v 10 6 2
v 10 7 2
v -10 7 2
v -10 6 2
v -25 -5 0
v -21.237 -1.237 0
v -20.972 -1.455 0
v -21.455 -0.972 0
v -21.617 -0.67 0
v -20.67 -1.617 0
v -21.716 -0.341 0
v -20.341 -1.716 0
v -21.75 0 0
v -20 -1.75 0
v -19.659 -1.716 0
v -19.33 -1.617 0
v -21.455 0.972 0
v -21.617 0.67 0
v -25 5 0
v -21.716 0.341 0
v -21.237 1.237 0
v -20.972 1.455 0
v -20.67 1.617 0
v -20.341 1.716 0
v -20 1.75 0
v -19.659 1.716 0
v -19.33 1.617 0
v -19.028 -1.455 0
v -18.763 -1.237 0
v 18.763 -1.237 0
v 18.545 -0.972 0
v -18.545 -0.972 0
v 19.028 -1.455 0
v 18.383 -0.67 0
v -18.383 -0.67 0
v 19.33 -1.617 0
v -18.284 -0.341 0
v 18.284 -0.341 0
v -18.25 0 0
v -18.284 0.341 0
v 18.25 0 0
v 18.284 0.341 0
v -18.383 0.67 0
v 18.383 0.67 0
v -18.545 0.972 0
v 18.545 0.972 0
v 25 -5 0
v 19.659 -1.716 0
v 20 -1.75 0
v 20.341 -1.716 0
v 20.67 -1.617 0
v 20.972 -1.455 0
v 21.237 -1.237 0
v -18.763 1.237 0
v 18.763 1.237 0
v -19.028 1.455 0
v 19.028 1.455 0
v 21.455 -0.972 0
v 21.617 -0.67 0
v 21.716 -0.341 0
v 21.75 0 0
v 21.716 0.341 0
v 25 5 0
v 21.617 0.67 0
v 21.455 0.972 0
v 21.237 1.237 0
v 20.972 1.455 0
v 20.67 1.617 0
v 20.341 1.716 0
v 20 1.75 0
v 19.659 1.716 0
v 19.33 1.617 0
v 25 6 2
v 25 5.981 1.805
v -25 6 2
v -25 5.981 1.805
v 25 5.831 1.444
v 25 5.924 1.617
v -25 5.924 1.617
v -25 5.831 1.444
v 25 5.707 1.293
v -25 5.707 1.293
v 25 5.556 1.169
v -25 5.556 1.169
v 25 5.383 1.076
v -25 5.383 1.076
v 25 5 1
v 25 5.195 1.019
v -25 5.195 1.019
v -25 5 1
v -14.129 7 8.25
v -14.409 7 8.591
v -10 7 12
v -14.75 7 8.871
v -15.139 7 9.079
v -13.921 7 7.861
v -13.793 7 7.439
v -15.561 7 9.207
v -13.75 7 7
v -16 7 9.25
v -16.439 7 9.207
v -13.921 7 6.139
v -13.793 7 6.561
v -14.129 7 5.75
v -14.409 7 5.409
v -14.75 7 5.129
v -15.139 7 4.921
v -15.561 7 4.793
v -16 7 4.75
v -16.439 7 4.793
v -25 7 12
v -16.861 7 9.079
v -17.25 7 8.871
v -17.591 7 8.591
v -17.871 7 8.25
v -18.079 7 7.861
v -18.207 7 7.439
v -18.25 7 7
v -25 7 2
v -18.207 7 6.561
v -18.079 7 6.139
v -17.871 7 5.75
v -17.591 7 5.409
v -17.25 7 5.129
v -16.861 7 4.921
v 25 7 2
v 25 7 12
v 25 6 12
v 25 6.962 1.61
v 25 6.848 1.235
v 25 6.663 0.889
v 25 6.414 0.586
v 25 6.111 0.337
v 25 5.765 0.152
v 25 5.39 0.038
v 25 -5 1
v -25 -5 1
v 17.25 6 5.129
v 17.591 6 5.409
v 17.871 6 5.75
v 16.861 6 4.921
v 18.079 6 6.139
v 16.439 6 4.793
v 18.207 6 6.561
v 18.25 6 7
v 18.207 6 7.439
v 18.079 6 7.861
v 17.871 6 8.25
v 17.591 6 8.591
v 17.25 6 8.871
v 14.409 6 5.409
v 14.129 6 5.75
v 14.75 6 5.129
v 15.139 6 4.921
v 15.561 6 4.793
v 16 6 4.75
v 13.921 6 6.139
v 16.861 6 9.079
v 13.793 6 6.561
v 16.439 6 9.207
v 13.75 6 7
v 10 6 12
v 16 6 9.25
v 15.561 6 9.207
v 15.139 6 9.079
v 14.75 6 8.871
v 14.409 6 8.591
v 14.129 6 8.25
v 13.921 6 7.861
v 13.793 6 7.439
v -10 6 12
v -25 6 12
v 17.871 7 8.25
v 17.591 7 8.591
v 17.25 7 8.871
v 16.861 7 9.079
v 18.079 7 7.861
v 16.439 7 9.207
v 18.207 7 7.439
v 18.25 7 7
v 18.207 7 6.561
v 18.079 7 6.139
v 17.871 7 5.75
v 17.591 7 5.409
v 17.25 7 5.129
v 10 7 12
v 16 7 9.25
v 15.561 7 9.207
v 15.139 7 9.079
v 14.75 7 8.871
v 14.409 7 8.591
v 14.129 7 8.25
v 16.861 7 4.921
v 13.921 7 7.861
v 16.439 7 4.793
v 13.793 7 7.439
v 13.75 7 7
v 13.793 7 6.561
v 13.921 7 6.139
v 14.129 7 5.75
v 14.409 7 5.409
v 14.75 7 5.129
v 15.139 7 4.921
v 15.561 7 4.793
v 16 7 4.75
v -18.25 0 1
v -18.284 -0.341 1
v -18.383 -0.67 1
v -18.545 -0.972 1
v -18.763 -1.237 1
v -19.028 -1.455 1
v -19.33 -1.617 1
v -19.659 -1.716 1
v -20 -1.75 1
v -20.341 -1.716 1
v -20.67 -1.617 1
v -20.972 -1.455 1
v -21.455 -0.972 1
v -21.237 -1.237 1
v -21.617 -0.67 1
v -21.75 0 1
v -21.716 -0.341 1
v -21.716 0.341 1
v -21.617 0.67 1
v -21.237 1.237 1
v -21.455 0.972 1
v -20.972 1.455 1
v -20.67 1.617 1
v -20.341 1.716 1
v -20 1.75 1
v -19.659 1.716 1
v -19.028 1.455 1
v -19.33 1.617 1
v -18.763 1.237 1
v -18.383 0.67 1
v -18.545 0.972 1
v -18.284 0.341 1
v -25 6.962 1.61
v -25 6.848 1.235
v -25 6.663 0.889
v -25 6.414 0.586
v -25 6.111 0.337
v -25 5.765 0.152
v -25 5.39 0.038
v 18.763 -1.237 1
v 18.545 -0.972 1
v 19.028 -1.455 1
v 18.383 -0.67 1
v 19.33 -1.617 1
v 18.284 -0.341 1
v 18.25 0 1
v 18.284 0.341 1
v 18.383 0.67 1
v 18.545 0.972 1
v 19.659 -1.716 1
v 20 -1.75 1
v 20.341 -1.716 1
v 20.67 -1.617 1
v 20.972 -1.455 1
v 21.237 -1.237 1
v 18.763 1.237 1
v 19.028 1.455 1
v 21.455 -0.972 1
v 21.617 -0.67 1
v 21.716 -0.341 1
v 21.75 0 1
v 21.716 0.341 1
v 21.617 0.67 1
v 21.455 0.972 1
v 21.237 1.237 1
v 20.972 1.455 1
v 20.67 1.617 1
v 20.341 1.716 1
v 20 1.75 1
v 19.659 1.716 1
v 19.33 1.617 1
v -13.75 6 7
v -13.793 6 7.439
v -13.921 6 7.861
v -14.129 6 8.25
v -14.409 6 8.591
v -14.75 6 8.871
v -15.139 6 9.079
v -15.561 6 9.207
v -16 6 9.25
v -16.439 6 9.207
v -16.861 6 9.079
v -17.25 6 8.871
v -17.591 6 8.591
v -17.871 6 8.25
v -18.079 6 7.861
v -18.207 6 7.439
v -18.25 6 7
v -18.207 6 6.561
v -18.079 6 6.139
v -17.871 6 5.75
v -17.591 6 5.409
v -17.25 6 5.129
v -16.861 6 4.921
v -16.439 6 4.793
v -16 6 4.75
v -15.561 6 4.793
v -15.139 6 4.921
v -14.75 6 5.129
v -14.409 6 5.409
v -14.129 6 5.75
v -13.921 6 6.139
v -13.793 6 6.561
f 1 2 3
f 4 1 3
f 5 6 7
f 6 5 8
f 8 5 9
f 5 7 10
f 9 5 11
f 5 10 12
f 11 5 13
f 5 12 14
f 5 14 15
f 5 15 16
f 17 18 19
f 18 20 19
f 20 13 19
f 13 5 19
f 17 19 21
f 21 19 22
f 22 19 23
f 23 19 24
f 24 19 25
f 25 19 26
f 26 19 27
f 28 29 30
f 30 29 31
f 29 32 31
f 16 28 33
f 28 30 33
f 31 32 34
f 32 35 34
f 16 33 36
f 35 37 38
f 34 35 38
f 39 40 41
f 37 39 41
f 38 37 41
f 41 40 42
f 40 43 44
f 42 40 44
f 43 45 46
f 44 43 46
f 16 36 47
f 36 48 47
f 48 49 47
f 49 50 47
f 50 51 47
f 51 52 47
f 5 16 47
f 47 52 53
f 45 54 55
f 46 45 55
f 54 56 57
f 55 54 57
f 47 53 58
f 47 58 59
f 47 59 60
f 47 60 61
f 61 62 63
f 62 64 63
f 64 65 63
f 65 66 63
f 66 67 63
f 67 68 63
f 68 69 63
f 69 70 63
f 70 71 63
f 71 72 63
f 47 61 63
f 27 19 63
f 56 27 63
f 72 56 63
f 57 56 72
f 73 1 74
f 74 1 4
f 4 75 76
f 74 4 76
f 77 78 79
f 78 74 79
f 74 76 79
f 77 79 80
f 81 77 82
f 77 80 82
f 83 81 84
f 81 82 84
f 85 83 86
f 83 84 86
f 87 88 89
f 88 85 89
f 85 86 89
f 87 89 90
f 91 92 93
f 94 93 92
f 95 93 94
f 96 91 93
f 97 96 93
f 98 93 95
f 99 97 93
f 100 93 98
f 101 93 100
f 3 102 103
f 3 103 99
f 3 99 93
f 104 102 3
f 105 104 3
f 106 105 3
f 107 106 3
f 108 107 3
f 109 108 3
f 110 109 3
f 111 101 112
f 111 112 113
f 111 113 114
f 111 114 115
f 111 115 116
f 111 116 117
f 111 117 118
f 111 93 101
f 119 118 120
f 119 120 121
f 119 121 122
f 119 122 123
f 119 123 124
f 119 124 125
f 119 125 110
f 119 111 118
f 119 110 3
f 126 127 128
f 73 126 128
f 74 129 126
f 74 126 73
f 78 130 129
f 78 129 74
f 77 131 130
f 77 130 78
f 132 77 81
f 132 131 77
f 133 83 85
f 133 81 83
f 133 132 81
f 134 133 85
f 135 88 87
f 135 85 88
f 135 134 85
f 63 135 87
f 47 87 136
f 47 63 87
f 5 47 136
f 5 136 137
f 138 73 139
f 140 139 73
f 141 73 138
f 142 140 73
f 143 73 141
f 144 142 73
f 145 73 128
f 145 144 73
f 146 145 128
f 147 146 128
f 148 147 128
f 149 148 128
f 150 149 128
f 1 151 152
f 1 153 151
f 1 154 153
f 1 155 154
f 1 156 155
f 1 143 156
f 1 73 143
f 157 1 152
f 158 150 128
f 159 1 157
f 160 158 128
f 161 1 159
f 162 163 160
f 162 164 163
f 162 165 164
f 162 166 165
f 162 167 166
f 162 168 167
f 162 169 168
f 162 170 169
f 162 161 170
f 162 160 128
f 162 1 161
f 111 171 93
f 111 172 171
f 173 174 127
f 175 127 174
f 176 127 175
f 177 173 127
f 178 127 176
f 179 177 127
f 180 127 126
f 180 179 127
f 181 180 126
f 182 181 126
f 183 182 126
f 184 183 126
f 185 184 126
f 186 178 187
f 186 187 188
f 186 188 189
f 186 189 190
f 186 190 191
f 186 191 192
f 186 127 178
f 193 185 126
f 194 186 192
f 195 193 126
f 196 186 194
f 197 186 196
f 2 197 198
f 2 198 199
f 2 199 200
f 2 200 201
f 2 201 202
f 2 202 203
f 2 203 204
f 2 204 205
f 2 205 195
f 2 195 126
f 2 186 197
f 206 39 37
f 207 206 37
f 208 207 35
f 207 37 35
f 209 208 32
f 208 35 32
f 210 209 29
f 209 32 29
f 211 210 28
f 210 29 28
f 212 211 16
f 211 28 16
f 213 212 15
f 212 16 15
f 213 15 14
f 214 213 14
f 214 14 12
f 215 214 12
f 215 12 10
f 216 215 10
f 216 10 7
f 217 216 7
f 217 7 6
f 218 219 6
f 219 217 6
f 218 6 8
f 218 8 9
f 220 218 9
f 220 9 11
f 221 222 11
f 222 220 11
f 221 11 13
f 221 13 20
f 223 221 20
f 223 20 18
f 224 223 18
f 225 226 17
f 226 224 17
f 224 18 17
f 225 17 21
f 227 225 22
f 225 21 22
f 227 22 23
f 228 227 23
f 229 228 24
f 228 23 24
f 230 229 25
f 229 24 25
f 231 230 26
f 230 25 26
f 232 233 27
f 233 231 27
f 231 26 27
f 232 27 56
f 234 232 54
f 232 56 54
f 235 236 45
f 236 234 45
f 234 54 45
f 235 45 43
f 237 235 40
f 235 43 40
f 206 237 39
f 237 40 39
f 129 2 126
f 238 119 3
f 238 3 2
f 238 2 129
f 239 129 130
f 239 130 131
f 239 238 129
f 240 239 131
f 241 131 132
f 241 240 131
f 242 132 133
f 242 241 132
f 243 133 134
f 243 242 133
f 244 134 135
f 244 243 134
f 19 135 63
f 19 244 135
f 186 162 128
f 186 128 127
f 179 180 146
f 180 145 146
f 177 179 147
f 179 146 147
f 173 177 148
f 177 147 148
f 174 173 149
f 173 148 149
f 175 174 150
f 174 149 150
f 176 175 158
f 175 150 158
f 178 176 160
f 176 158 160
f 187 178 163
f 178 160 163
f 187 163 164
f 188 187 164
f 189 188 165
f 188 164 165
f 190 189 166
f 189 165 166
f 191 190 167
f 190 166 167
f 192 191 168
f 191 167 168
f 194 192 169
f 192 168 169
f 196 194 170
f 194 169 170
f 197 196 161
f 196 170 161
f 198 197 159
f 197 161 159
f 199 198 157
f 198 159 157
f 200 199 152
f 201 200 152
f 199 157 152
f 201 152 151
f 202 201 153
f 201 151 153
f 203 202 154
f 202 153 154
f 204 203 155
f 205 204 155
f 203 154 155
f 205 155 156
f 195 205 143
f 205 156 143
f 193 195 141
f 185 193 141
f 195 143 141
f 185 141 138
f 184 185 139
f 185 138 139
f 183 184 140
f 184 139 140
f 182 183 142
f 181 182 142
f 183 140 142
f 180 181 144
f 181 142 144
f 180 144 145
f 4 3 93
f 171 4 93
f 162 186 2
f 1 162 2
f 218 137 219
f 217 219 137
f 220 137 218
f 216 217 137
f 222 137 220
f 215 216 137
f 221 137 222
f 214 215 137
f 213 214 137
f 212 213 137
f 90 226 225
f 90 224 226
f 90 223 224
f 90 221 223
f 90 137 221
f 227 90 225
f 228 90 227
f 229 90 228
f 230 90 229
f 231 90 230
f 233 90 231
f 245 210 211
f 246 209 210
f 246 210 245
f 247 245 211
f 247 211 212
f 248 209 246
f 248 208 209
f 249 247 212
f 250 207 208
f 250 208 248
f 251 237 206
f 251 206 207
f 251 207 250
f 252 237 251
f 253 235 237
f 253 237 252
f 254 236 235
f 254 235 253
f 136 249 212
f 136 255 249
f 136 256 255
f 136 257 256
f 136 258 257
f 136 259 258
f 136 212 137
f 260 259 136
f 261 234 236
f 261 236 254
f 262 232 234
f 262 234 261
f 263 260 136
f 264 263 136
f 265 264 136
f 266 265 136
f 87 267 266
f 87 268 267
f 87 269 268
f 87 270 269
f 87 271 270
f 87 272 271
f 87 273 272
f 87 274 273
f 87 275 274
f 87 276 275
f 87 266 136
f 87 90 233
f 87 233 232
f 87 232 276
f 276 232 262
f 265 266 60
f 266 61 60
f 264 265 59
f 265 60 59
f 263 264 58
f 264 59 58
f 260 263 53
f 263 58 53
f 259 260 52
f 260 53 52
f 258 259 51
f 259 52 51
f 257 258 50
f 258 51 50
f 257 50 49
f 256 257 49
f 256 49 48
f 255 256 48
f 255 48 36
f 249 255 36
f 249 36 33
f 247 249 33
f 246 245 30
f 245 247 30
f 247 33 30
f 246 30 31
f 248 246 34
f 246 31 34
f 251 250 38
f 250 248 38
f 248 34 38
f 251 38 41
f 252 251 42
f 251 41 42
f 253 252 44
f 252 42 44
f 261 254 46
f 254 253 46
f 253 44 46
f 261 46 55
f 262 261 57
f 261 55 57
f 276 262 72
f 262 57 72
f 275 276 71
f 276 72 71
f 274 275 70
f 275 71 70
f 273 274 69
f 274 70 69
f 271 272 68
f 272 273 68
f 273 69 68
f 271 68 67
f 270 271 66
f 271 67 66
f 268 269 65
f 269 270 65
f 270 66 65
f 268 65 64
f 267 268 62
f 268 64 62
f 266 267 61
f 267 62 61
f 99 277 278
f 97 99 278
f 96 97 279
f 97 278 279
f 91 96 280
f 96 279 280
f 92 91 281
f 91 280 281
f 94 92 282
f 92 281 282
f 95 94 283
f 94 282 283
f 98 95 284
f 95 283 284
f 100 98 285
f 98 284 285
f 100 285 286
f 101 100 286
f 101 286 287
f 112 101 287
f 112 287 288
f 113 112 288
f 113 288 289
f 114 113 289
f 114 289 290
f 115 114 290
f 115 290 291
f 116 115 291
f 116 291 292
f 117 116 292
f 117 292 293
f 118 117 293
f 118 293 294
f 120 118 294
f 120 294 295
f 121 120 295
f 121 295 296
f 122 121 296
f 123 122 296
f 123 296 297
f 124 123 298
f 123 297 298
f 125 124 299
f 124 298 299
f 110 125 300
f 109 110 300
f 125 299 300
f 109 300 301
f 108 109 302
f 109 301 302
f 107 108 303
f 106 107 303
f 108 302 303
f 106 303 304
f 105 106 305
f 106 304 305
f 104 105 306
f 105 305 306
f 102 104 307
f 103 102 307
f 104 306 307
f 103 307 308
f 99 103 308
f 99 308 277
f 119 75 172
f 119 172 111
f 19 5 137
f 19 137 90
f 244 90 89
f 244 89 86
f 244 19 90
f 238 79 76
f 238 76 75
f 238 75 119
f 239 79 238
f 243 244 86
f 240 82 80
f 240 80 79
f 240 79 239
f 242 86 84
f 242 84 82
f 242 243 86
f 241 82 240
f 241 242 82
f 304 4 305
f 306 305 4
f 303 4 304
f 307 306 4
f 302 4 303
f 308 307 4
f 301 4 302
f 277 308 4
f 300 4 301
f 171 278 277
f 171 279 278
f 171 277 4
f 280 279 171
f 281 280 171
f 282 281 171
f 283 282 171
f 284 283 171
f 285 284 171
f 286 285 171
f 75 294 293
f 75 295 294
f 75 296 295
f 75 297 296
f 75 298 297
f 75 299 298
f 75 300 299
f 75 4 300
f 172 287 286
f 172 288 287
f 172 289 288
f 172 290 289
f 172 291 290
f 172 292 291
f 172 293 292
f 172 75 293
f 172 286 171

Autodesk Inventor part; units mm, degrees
ref_plane "YZ Plane" through (0, 0, 0) normal (1, 0, 0) x (0, 1, 0)
ref_plane "XZ Plane" through (0, 0, 0) normal (0, 1, 0) x (-1, 0, 0)
ref_plane "XY Plane" through (0, 0, 0) normal (0, 0, 1) x (1, 0, 0)
sketch "Sketch1" plane through (0, 0, 0) normal (0, 0, 1) x (1, 0, 0)
  line L0 (-25, 5) -> (25, 5)
  line L1 (25, 5) -> (25, -5)
  line L2 (25, -5) -> (-25, -5)
  line L3 (-25, -5) -> (-25, 5)
  line L4 (-25, 5) -> (25, -5) construction
  line L5 (25, 5) -> (-25, -5) construction
  circle A0 centre (-20, 0) radius 1.75
  line L6 (0, 0) -> (0, -5.5046) construction
  circle A1 centre (20, 0) radius 1.75
  dimension "d0" = 50
  dimension "d1" = 10
  dimension "d2" = 3.5
  dimension "d3" = 40
  dimension "d4" = 5
extrude "Plate1" add sketch "Sketch1" along normal blind 1
sketch "Sketch2" plane through (-25, 6, 2) normal (0, 1, 0) x (-1, 0, 0)
  line L0 (-50, 0) -> (0, 0)
  line L1 (0, 0) -> (0, 10)
  line L2 (0, 10) -> (-50, 10)
  line L3 (-50, 10) -> (-50, 0)
edge flange "Flange1" height 12 angle 90 thickness 1 bend radius 1 thickness toward (0, 1, 0) relief tear relief width 1 relief depth 0.5 edges at (0, 5, 1) wall of the first edge with corners at (25, 6, 2) (-25, 6, 2) (-25, 6, 12) (25, 6, 12)
bend "Bend1"
corner "Corner1"
sketch "Sketch3" plane through (-25, 6, 12) normal (0, -1, 0) x (1, 0, 0)
  circle A0 centre (41, -5) radius 2.25
  circle A1 centre (9, -5) radius 2.25
  line L0 (25, -12) -> (25, 5.1941) construction
  line L1 (50, -11) -> (0, -11) construction
  dimension "d20" = 4.5
  dimension "d21" = 4.5
  dimension "d22" = 32
  dimension "d23" = 6
extrude "Cut1" cut sketch "Sketch3" against normal blind 1
sketch "Sketch4" plane through (-25, 7, 12) normal (0, 1, 0) x (1, 0, 0)
  line L0 (50, 0) -> (0, 0) projected
  line L1 (35, 10) -> (15, 10)
  line L2 (15, 10) -> (15, 0)
  line L3 (15, 0) -> (35, 0)
  line L4 (35, 0) -> (35, 10)
  line L5 (35, 10) -> (15, 0) construction
  line L6 (15, 10) -> (35, 0) construction
  line L7 (50, 10) -> (0, 10) projected
  point P0 (25, 12)
  point P1 (25, 5)
  dimension "d26" = 20
extrude "Cut2" cut sketch "Sketch4" against normal blind 1
equation "\"d20\" = d21"
equation "\"d24\" = 厚度"
equation "\"d27\" = 厚度"
equation "\"d9\" = 厚度"
equation "\"d10\" = 折彎離隙寬度"
equation "\"d11\" = 折彎離隙深度"
equation "\"d12\" = 最小剩餘"
equation "\"d13\" = 轉移半徑"
equation "\"d16\" = 折彎半徑"
equation "\"d17\" = 轉角離隙大小"
equation "\"d18\" = 間隙大小"
equation "\"d19\" = Jacobi半徑大小"
equation "\"折彎半徑\" = 厚度"
equation "\"折彎離隙寬度\" = 厚度"
equation "\"折彎離隙深度\" = 0.5 * 厚度"
equation "\"轉角離隙大小\" = 4 * 厚度"
equation "\"最小剩餘\" = 2 * 厚度"
equation "\"轉移半徑\" = 折彎半徑"
equation "\"Jacobi半徑大小\" = 折彎半徑"
equation "\"間隙大小\" = 厚度"
equation "\"厚度\" = 1"
properties part number "fan_fix_plate_connect2"
